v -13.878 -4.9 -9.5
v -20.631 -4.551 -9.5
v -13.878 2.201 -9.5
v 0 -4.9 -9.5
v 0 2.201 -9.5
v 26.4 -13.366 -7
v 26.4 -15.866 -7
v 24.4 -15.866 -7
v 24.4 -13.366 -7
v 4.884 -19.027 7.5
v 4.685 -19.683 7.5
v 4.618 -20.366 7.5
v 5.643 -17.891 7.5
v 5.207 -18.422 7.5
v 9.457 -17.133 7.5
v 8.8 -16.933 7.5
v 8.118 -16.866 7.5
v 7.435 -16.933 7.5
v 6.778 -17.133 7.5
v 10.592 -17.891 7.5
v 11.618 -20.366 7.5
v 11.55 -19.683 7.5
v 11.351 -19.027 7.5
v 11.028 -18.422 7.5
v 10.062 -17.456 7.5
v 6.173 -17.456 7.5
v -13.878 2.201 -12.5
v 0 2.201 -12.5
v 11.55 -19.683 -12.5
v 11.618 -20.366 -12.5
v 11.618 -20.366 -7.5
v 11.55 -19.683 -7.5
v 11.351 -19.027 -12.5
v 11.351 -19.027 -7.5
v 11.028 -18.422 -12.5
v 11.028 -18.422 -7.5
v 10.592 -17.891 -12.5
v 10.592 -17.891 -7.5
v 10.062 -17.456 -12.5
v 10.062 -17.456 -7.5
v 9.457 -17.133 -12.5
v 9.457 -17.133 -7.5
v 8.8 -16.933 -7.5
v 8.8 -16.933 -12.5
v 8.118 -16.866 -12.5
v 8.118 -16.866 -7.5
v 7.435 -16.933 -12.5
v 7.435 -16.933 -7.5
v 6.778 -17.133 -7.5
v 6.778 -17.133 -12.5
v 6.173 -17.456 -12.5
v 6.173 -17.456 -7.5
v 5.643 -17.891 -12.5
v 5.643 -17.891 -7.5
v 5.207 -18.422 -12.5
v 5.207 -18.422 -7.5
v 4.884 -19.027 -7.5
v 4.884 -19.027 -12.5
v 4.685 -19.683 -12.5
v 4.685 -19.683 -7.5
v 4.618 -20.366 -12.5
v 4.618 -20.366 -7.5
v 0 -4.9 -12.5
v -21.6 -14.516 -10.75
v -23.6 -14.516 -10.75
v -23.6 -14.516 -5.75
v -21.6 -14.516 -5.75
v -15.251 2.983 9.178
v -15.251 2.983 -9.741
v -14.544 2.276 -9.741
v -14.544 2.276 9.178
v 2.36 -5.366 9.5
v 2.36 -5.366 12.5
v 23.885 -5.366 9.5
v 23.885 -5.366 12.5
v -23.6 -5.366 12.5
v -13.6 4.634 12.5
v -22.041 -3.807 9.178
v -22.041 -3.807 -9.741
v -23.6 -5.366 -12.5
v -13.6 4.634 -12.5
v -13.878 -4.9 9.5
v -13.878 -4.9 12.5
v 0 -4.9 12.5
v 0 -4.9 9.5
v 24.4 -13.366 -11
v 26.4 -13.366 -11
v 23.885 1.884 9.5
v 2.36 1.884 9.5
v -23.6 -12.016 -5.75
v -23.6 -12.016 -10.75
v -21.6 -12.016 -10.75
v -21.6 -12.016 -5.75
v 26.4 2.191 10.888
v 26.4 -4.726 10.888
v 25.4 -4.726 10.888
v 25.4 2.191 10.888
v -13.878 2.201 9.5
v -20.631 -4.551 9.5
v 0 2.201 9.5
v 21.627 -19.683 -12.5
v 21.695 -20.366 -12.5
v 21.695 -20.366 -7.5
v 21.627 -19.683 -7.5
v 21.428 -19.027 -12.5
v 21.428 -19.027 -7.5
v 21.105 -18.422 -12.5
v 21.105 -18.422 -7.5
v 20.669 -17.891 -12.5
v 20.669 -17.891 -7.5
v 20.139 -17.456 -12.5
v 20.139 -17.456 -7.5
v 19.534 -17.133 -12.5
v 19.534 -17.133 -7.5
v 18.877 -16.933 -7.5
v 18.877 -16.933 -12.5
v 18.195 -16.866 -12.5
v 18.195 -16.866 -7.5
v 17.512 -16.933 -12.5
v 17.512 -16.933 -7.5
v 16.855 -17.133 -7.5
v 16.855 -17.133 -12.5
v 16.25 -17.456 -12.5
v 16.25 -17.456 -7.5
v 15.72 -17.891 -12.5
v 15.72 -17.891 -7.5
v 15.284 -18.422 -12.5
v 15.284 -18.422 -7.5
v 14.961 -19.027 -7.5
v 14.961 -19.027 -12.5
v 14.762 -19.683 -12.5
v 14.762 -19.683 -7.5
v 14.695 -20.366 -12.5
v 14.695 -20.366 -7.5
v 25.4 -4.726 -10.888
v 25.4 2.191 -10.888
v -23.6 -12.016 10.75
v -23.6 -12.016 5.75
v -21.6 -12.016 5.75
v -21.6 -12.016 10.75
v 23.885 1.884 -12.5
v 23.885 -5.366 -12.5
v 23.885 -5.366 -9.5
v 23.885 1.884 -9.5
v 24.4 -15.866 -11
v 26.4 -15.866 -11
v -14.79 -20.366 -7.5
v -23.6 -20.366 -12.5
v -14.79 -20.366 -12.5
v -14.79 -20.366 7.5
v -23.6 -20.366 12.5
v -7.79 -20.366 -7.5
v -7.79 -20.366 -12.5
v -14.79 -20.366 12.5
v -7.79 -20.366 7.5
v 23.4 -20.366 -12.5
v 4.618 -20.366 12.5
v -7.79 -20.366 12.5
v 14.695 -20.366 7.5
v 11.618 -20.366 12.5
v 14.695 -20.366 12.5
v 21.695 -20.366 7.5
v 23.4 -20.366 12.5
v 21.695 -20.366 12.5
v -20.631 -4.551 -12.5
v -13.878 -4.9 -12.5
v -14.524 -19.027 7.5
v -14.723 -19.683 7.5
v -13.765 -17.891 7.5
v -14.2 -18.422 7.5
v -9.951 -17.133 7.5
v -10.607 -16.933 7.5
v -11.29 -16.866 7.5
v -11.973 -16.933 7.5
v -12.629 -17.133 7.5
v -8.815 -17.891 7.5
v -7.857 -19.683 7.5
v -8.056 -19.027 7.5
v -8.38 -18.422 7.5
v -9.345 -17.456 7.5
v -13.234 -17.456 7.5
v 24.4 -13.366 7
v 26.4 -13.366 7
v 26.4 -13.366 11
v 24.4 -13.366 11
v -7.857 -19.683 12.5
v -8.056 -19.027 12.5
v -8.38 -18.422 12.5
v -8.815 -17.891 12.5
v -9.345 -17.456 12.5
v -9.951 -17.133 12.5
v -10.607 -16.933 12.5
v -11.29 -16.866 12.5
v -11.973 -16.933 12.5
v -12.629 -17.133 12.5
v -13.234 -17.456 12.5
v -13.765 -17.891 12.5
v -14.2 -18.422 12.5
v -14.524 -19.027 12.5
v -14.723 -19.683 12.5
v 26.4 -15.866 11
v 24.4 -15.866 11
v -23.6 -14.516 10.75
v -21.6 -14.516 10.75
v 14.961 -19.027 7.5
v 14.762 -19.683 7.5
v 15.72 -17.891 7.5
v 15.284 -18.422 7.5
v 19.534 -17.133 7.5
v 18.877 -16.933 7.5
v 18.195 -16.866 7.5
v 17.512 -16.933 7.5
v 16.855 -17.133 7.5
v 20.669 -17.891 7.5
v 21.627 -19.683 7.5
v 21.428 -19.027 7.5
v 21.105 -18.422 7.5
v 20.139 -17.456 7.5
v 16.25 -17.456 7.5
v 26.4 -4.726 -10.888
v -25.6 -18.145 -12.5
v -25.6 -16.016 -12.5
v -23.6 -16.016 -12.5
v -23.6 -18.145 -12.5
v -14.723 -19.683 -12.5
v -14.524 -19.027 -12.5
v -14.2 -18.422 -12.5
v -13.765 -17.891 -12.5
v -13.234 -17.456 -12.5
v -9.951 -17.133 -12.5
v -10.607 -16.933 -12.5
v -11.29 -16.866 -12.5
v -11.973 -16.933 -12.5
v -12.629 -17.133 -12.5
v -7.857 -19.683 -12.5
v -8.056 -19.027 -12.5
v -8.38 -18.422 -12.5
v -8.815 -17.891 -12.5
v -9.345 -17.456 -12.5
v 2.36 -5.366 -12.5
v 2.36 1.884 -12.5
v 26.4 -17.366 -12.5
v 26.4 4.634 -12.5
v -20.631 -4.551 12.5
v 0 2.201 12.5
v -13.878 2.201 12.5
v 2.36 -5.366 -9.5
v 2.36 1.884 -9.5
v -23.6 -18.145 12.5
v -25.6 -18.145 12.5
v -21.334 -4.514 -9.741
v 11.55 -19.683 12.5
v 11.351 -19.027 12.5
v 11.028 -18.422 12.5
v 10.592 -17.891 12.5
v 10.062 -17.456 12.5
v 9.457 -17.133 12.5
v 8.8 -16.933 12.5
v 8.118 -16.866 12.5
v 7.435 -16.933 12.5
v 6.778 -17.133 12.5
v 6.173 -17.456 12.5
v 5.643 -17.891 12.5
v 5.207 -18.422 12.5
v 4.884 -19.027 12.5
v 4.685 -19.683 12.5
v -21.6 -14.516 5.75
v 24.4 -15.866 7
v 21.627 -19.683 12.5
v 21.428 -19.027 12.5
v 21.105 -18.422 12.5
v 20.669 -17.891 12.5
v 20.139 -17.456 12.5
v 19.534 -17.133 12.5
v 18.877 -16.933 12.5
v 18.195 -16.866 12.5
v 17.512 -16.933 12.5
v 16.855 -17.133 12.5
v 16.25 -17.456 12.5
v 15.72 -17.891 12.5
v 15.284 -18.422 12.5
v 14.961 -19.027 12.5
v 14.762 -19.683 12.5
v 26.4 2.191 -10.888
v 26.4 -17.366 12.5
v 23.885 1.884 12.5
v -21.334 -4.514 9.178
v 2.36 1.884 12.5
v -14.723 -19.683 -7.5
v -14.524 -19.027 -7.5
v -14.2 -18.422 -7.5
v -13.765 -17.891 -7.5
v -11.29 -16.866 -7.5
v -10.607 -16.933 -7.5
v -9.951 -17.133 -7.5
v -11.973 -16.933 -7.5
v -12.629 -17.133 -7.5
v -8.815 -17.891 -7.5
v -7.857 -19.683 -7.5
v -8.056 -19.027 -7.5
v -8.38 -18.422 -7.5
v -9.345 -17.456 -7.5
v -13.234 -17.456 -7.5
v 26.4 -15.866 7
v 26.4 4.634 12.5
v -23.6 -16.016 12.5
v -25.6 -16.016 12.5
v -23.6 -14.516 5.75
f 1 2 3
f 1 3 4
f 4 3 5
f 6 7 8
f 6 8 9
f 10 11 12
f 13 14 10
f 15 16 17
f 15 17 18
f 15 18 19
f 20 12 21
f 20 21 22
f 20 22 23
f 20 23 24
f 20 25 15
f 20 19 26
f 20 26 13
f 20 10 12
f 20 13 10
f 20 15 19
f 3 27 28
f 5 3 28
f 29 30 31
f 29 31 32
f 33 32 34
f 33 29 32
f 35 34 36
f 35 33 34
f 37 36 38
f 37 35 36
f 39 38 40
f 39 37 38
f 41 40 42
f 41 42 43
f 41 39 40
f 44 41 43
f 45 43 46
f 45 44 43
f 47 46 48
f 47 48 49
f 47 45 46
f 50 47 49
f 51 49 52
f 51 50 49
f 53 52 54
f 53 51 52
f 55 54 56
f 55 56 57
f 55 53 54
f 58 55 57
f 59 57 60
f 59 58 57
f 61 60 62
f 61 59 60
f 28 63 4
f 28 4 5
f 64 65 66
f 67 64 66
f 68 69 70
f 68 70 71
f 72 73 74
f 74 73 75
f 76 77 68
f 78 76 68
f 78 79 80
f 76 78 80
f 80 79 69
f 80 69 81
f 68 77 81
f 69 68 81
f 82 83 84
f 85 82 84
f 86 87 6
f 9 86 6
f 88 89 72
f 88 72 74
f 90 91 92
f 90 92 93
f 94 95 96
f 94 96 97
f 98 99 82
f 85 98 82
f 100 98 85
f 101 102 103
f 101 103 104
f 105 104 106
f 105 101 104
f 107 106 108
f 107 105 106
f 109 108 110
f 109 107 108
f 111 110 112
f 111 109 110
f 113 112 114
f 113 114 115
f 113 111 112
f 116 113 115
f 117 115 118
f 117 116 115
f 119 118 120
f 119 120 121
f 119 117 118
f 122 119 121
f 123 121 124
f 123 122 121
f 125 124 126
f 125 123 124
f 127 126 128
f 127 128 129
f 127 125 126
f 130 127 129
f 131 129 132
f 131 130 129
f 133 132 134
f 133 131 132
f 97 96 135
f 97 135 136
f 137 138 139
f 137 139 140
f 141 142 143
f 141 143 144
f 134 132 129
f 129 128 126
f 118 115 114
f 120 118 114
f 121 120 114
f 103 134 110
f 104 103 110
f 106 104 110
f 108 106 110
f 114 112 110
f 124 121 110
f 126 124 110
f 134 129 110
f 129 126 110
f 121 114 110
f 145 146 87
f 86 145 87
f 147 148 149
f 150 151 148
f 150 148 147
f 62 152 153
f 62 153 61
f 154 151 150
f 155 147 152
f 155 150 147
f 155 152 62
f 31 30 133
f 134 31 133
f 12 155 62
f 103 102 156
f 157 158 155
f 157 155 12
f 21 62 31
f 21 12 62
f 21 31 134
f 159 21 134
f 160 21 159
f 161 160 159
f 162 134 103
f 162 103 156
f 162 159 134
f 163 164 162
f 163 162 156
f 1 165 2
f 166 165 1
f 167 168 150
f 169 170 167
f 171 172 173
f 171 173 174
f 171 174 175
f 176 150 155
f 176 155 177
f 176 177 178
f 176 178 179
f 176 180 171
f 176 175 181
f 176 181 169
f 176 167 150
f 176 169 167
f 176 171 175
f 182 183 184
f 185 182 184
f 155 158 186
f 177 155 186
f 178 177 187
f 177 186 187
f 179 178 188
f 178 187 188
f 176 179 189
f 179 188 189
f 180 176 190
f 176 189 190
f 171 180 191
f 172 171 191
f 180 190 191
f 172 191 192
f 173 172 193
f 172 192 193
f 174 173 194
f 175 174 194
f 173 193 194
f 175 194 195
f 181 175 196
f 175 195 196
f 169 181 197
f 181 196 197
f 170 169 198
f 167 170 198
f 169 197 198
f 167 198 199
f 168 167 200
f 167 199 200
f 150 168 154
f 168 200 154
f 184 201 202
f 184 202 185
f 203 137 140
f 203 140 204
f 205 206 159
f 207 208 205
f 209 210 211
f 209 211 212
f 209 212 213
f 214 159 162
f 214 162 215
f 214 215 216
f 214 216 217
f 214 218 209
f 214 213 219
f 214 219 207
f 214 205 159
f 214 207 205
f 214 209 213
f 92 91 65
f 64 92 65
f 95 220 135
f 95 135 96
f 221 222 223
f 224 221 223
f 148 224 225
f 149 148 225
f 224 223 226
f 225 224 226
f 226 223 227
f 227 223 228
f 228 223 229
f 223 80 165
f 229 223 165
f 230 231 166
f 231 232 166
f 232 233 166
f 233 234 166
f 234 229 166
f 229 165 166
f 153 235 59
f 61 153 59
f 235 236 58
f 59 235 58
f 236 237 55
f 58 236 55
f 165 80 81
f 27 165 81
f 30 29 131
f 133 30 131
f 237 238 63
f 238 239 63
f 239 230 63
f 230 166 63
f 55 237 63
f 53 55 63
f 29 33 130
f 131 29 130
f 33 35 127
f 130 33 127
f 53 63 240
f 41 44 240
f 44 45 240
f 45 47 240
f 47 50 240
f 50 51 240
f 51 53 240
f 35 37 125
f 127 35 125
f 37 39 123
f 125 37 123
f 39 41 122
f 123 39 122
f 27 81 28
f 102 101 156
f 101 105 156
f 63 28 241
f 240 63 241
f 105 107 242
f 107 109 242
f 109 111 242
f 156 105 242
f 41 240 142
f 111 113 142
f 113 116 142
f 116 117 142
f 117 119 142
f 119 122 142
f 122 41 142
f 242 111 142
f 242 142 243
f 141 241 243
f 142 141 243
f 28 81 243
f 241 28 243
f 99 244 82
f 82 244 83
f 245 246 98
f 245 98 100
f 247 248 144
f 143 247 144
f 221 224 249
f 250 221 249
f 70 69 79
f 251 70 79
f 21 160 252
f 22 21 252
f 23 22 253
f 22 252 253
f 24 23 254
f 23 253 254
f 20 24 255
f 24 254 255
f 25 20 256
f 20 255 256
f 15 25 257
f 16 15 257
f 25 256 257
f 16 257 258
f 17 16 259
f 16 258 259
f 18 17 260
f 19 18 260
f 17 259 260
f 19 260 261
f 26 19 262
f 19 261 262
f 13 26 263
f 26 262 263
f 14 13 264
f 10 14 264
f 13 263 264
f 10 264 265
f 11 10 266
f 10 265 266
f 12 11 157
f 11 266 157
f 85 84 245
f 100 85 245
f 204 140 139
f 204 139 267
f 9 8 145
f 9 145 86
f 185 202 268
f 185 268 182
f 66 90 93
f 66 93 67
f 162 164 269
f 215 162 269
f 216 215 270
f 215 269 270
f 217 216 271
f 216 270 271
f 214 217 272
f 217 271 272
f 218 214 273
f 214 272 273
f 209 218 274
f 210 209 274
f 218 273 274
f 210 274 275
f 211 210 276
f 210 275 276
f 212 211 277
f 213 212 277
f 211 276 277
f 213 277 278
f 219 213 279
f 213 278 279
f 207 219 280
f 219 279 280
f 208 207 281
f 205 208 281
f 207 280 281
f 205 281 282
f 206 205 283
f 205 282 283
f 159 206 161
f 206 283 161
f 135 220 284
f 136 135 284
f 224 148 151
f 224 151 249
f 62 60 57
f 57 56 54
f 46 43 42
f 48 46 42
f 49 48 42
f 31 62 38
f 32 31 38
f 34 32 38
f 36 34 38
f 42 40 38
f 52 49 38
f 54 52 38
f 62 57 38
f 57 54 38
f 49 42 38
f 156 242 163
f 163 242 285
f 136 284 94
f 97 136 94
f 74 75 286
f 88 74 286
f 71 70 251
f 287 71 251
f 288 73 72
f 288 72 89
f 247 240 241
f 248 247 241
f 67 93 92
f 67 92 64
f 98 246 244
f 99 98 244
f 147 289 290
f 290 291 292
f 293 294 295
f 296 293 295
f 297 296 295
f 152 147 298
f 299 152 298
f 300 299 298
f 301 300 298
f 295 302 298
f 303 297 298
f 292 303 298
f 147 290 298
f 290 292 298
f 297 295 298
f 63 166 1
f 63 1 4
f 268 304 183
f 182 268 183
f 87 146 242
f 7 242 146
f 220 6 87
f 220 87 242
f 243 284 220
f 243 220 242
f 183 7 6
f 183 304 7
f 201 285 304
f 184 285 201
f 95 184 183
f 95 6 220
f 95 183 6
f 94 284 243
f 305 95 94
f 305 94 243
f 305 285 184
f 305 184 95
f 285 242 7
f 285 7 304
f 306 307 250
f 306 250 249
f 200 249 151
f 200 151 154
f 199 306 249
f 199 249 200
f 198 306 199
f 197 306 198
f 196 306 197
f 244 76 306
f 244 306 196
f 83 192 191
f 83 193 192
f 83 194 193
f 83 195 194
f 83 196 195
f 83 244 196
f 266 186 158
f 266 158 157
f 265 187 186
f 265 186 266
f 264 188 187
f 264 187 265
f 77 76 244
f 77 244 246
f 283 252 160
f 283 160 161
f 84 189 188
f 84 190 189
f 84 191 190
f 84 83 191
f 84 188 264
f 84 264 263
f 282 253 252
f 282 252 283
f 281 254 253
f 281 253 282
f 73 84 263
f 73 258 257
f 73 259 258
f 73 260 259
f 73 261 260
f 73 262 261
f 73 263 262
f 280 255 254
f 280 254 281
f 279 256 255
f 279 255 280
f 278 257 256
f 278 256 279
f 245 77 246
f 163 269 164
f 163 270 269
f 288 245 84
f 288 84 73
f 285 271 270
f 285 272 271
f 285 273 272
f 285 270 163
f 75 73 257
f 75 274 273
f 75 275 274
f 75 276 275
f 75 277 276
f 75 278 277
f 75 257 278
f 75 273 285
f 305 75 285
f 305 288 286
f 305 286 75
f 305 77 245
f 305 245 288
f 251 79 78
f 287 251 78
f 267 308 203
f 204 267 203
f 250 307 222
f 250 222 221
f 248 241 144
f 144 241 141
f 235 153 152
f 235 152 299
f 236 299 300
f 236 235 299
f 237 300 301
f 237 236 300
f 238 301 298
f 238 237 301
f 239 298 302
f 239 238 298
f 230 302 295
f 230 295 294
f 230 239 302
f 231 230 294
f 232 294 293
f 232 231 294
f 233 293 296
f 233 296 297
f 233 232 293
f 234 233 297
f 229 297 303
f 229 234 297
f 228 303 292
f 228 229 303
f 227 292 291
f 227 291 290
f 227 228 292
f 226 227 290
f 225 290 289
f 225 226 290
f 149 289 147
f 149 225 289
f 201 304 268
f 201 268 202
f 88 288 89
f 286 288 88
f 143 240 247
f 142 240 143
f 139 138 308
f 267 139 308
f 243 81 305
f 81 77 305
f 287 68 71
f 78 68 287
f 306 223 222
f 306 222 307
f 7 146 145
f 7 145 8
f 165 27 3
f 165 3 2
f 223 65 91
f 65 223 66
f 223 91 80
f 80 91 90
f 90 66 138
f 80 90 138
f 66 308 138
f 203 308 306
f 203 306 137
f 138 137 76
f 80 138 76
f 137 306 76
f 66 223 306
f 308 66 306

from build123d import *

# Parameters (mm, degrees)
F0_W      = 50
F0_H      = 25
F1_DEPTH  = 12.5
F2_R      = 3.5
F3_DEPTH  = 5
F4_SIZE   = 10
F5_SIZE   = 3
F6_W      = 2.1288916469
F6_H      = 25
F7_DEPTH  = 2
F8_W      = 9.6029471606
F8_H      = 18.9187433571
F9_DEPTH  = 1
F10_W     = 13.8777932152
F10_H     = 7.1009902749
F10_W_2   = 21.5250877663
F10_H_2   = 7.2504867127
F11_DEPTH = 3
F12_W     = 6.9172445219
F12_H     = 21.7759581094
F13_DEPTH = 1
F14_W     = 2.5
F14_H     = 4
F15_DEPTH = 2
F16_W     = 2.5
F16_H     = 5
F17_DEPTH = 2


# Not quite as in the source:
# - a pattern or mirror of a feature is missing from the dataset's text; its kind, count and spacing are read off the source's solid


with BuildPart() as f1:
    # F0 (on Top) → F1 (new body, symmetric)
    with BuildSketch(Plane.XY):
        with Locations((1.3995850459, -7.8662077549)):
            Rectangle(F0_W, F0_H)
    extrude(amount=F1_DEPTH, both=True)

    # F2 (on face) → F3 (cut)
    with BuildSketch(Plane.XY.offset(12.5)):
        with Locations((-11.2899886444, -20.3662077549)):
            Circle(F2_R)
        with Locations((8.1175947562, -20.3662077549)):
            Circle(F2_R)
        with Locations((18.194610253, -20.3662077549)):
            Circle(F2_R)
    f3 = extrude(amount=-F3_DEPTH, mode=Mode.SUBTRACT)

    # F3_copies: F3 across plane
    add(f3.mirror(Plane(origin=(0, 0, 0), x_dir=(-1, 0, 0), z_dir=(0, 0, -1))), mode=Mode.SUBTRACT)

    # F4
    f4_edges = [f1.edges().sort_by_distance(p)[0] for p in [
        (-23.600415, 4.633792, 0),
    ]]
    chamfer(f4_edges, length=F4_SIZE)

    # F5
    f5_edges = [f1.edges().sort_by_distance(p)[0] for p in [
        (26.399585, -20.366208, 0),
    ]]
    chamfer(f5_edges, length=F5_SIZE)

    # F6 (on face) → F7 (join)
    with BuildSketch(Plane(origin=(-23.6004149541, 0, 0), x_dir=(0, -1, 0), z_dir=(-1, 0, 0))):
        with Locations((17.0801598579, 0)):
            Rectangle(F6_W, F6_H)
    extrude(amount=F7_DEPTH)

    # F8 (on face) → F9 (cut, symmetric)
    with BuildSketch(Plane(origin=(-9.1171035996, 9.1171035996, 0), x_dir=(-0.7071067812, -0.7071067812, 0), z_dir=(-0.7071067812, 0.7071067812, 0))):
        with Locations((13.4759480134, -0.2812528983)):
            Rectangle(F8_W, F8_H)
    extrude(amount=F9_DEPTH, both=True, mode=Mode.SUBTRACT)

    # F10 (on face) → F11 (cut)
    with BuildSketch(Plane.XY.offset(12.5)):
        with Locations((-6.9388966076, -1.3492055004)):
            Rectangle(F10_W, F10_H)
        Polygon((-13.8777932152, -4.8997006379), (-13.8777932152, 2.201289637), (-20.6305080792, -4.551425227), align=None)
        with Locations((13.1223001517, -1.7409643986)):
            Rectangle(F10_W_2, F10_H_2)
    f11 = extrude(amount=-F11_DEPTH, mode=Mode.SUBTRACT)

    # F11_copies: F11 across plane
    add(f11.mirror(Plane(origin=(0, 0, 0), x_dir=(-1, 0, 0), z_dir=(0, 0, -1))), mode=Mode.SUBTRACT)

    # F12 (on face) → F13 (cut, symmetric)
    with BuildSketch(Plane.YZ.offset(26.3995850459)):
        with Locations((-1.2673075544, -2.09453e-05)):
            Rectangle(F12_W, F12_H)
    extrude(amount=F13_DEPTH, both=True, mode=Mode.SUBTRACT)

    # F14 (on face) → F15 (cut)
    with BuildSketch(Plane.YZ.offset(26.3995850459)):
        with Locations((-14.6162077549, -9)):
            Rectangle(F14_W, F14_H)
        with Locations((-14.6162077549, 9)):
            Rectangle(F14_W, F14_H)
    extrude(amount=-F15_DEPTH, mode=Mode.SUBTRACT)

    # F16 (on face) → F17 (cut)
    with BuildSketch(Plane(origin=(-23.6004149541, 0, 0), x_dir=(0, -1, 0), z_dir=(-1, 0, 0))):
        with Locations((13.2657140344, 8.25)):
            Rectangle(F16_W, F16_H)
        with Locations((13.2657140344, -8.25)):
            Rectangle(F16_W, F16_H)
    extrude(amount=-F17_DEPTH, mode=Mode.SUBTRACT)


solid = f1.part
